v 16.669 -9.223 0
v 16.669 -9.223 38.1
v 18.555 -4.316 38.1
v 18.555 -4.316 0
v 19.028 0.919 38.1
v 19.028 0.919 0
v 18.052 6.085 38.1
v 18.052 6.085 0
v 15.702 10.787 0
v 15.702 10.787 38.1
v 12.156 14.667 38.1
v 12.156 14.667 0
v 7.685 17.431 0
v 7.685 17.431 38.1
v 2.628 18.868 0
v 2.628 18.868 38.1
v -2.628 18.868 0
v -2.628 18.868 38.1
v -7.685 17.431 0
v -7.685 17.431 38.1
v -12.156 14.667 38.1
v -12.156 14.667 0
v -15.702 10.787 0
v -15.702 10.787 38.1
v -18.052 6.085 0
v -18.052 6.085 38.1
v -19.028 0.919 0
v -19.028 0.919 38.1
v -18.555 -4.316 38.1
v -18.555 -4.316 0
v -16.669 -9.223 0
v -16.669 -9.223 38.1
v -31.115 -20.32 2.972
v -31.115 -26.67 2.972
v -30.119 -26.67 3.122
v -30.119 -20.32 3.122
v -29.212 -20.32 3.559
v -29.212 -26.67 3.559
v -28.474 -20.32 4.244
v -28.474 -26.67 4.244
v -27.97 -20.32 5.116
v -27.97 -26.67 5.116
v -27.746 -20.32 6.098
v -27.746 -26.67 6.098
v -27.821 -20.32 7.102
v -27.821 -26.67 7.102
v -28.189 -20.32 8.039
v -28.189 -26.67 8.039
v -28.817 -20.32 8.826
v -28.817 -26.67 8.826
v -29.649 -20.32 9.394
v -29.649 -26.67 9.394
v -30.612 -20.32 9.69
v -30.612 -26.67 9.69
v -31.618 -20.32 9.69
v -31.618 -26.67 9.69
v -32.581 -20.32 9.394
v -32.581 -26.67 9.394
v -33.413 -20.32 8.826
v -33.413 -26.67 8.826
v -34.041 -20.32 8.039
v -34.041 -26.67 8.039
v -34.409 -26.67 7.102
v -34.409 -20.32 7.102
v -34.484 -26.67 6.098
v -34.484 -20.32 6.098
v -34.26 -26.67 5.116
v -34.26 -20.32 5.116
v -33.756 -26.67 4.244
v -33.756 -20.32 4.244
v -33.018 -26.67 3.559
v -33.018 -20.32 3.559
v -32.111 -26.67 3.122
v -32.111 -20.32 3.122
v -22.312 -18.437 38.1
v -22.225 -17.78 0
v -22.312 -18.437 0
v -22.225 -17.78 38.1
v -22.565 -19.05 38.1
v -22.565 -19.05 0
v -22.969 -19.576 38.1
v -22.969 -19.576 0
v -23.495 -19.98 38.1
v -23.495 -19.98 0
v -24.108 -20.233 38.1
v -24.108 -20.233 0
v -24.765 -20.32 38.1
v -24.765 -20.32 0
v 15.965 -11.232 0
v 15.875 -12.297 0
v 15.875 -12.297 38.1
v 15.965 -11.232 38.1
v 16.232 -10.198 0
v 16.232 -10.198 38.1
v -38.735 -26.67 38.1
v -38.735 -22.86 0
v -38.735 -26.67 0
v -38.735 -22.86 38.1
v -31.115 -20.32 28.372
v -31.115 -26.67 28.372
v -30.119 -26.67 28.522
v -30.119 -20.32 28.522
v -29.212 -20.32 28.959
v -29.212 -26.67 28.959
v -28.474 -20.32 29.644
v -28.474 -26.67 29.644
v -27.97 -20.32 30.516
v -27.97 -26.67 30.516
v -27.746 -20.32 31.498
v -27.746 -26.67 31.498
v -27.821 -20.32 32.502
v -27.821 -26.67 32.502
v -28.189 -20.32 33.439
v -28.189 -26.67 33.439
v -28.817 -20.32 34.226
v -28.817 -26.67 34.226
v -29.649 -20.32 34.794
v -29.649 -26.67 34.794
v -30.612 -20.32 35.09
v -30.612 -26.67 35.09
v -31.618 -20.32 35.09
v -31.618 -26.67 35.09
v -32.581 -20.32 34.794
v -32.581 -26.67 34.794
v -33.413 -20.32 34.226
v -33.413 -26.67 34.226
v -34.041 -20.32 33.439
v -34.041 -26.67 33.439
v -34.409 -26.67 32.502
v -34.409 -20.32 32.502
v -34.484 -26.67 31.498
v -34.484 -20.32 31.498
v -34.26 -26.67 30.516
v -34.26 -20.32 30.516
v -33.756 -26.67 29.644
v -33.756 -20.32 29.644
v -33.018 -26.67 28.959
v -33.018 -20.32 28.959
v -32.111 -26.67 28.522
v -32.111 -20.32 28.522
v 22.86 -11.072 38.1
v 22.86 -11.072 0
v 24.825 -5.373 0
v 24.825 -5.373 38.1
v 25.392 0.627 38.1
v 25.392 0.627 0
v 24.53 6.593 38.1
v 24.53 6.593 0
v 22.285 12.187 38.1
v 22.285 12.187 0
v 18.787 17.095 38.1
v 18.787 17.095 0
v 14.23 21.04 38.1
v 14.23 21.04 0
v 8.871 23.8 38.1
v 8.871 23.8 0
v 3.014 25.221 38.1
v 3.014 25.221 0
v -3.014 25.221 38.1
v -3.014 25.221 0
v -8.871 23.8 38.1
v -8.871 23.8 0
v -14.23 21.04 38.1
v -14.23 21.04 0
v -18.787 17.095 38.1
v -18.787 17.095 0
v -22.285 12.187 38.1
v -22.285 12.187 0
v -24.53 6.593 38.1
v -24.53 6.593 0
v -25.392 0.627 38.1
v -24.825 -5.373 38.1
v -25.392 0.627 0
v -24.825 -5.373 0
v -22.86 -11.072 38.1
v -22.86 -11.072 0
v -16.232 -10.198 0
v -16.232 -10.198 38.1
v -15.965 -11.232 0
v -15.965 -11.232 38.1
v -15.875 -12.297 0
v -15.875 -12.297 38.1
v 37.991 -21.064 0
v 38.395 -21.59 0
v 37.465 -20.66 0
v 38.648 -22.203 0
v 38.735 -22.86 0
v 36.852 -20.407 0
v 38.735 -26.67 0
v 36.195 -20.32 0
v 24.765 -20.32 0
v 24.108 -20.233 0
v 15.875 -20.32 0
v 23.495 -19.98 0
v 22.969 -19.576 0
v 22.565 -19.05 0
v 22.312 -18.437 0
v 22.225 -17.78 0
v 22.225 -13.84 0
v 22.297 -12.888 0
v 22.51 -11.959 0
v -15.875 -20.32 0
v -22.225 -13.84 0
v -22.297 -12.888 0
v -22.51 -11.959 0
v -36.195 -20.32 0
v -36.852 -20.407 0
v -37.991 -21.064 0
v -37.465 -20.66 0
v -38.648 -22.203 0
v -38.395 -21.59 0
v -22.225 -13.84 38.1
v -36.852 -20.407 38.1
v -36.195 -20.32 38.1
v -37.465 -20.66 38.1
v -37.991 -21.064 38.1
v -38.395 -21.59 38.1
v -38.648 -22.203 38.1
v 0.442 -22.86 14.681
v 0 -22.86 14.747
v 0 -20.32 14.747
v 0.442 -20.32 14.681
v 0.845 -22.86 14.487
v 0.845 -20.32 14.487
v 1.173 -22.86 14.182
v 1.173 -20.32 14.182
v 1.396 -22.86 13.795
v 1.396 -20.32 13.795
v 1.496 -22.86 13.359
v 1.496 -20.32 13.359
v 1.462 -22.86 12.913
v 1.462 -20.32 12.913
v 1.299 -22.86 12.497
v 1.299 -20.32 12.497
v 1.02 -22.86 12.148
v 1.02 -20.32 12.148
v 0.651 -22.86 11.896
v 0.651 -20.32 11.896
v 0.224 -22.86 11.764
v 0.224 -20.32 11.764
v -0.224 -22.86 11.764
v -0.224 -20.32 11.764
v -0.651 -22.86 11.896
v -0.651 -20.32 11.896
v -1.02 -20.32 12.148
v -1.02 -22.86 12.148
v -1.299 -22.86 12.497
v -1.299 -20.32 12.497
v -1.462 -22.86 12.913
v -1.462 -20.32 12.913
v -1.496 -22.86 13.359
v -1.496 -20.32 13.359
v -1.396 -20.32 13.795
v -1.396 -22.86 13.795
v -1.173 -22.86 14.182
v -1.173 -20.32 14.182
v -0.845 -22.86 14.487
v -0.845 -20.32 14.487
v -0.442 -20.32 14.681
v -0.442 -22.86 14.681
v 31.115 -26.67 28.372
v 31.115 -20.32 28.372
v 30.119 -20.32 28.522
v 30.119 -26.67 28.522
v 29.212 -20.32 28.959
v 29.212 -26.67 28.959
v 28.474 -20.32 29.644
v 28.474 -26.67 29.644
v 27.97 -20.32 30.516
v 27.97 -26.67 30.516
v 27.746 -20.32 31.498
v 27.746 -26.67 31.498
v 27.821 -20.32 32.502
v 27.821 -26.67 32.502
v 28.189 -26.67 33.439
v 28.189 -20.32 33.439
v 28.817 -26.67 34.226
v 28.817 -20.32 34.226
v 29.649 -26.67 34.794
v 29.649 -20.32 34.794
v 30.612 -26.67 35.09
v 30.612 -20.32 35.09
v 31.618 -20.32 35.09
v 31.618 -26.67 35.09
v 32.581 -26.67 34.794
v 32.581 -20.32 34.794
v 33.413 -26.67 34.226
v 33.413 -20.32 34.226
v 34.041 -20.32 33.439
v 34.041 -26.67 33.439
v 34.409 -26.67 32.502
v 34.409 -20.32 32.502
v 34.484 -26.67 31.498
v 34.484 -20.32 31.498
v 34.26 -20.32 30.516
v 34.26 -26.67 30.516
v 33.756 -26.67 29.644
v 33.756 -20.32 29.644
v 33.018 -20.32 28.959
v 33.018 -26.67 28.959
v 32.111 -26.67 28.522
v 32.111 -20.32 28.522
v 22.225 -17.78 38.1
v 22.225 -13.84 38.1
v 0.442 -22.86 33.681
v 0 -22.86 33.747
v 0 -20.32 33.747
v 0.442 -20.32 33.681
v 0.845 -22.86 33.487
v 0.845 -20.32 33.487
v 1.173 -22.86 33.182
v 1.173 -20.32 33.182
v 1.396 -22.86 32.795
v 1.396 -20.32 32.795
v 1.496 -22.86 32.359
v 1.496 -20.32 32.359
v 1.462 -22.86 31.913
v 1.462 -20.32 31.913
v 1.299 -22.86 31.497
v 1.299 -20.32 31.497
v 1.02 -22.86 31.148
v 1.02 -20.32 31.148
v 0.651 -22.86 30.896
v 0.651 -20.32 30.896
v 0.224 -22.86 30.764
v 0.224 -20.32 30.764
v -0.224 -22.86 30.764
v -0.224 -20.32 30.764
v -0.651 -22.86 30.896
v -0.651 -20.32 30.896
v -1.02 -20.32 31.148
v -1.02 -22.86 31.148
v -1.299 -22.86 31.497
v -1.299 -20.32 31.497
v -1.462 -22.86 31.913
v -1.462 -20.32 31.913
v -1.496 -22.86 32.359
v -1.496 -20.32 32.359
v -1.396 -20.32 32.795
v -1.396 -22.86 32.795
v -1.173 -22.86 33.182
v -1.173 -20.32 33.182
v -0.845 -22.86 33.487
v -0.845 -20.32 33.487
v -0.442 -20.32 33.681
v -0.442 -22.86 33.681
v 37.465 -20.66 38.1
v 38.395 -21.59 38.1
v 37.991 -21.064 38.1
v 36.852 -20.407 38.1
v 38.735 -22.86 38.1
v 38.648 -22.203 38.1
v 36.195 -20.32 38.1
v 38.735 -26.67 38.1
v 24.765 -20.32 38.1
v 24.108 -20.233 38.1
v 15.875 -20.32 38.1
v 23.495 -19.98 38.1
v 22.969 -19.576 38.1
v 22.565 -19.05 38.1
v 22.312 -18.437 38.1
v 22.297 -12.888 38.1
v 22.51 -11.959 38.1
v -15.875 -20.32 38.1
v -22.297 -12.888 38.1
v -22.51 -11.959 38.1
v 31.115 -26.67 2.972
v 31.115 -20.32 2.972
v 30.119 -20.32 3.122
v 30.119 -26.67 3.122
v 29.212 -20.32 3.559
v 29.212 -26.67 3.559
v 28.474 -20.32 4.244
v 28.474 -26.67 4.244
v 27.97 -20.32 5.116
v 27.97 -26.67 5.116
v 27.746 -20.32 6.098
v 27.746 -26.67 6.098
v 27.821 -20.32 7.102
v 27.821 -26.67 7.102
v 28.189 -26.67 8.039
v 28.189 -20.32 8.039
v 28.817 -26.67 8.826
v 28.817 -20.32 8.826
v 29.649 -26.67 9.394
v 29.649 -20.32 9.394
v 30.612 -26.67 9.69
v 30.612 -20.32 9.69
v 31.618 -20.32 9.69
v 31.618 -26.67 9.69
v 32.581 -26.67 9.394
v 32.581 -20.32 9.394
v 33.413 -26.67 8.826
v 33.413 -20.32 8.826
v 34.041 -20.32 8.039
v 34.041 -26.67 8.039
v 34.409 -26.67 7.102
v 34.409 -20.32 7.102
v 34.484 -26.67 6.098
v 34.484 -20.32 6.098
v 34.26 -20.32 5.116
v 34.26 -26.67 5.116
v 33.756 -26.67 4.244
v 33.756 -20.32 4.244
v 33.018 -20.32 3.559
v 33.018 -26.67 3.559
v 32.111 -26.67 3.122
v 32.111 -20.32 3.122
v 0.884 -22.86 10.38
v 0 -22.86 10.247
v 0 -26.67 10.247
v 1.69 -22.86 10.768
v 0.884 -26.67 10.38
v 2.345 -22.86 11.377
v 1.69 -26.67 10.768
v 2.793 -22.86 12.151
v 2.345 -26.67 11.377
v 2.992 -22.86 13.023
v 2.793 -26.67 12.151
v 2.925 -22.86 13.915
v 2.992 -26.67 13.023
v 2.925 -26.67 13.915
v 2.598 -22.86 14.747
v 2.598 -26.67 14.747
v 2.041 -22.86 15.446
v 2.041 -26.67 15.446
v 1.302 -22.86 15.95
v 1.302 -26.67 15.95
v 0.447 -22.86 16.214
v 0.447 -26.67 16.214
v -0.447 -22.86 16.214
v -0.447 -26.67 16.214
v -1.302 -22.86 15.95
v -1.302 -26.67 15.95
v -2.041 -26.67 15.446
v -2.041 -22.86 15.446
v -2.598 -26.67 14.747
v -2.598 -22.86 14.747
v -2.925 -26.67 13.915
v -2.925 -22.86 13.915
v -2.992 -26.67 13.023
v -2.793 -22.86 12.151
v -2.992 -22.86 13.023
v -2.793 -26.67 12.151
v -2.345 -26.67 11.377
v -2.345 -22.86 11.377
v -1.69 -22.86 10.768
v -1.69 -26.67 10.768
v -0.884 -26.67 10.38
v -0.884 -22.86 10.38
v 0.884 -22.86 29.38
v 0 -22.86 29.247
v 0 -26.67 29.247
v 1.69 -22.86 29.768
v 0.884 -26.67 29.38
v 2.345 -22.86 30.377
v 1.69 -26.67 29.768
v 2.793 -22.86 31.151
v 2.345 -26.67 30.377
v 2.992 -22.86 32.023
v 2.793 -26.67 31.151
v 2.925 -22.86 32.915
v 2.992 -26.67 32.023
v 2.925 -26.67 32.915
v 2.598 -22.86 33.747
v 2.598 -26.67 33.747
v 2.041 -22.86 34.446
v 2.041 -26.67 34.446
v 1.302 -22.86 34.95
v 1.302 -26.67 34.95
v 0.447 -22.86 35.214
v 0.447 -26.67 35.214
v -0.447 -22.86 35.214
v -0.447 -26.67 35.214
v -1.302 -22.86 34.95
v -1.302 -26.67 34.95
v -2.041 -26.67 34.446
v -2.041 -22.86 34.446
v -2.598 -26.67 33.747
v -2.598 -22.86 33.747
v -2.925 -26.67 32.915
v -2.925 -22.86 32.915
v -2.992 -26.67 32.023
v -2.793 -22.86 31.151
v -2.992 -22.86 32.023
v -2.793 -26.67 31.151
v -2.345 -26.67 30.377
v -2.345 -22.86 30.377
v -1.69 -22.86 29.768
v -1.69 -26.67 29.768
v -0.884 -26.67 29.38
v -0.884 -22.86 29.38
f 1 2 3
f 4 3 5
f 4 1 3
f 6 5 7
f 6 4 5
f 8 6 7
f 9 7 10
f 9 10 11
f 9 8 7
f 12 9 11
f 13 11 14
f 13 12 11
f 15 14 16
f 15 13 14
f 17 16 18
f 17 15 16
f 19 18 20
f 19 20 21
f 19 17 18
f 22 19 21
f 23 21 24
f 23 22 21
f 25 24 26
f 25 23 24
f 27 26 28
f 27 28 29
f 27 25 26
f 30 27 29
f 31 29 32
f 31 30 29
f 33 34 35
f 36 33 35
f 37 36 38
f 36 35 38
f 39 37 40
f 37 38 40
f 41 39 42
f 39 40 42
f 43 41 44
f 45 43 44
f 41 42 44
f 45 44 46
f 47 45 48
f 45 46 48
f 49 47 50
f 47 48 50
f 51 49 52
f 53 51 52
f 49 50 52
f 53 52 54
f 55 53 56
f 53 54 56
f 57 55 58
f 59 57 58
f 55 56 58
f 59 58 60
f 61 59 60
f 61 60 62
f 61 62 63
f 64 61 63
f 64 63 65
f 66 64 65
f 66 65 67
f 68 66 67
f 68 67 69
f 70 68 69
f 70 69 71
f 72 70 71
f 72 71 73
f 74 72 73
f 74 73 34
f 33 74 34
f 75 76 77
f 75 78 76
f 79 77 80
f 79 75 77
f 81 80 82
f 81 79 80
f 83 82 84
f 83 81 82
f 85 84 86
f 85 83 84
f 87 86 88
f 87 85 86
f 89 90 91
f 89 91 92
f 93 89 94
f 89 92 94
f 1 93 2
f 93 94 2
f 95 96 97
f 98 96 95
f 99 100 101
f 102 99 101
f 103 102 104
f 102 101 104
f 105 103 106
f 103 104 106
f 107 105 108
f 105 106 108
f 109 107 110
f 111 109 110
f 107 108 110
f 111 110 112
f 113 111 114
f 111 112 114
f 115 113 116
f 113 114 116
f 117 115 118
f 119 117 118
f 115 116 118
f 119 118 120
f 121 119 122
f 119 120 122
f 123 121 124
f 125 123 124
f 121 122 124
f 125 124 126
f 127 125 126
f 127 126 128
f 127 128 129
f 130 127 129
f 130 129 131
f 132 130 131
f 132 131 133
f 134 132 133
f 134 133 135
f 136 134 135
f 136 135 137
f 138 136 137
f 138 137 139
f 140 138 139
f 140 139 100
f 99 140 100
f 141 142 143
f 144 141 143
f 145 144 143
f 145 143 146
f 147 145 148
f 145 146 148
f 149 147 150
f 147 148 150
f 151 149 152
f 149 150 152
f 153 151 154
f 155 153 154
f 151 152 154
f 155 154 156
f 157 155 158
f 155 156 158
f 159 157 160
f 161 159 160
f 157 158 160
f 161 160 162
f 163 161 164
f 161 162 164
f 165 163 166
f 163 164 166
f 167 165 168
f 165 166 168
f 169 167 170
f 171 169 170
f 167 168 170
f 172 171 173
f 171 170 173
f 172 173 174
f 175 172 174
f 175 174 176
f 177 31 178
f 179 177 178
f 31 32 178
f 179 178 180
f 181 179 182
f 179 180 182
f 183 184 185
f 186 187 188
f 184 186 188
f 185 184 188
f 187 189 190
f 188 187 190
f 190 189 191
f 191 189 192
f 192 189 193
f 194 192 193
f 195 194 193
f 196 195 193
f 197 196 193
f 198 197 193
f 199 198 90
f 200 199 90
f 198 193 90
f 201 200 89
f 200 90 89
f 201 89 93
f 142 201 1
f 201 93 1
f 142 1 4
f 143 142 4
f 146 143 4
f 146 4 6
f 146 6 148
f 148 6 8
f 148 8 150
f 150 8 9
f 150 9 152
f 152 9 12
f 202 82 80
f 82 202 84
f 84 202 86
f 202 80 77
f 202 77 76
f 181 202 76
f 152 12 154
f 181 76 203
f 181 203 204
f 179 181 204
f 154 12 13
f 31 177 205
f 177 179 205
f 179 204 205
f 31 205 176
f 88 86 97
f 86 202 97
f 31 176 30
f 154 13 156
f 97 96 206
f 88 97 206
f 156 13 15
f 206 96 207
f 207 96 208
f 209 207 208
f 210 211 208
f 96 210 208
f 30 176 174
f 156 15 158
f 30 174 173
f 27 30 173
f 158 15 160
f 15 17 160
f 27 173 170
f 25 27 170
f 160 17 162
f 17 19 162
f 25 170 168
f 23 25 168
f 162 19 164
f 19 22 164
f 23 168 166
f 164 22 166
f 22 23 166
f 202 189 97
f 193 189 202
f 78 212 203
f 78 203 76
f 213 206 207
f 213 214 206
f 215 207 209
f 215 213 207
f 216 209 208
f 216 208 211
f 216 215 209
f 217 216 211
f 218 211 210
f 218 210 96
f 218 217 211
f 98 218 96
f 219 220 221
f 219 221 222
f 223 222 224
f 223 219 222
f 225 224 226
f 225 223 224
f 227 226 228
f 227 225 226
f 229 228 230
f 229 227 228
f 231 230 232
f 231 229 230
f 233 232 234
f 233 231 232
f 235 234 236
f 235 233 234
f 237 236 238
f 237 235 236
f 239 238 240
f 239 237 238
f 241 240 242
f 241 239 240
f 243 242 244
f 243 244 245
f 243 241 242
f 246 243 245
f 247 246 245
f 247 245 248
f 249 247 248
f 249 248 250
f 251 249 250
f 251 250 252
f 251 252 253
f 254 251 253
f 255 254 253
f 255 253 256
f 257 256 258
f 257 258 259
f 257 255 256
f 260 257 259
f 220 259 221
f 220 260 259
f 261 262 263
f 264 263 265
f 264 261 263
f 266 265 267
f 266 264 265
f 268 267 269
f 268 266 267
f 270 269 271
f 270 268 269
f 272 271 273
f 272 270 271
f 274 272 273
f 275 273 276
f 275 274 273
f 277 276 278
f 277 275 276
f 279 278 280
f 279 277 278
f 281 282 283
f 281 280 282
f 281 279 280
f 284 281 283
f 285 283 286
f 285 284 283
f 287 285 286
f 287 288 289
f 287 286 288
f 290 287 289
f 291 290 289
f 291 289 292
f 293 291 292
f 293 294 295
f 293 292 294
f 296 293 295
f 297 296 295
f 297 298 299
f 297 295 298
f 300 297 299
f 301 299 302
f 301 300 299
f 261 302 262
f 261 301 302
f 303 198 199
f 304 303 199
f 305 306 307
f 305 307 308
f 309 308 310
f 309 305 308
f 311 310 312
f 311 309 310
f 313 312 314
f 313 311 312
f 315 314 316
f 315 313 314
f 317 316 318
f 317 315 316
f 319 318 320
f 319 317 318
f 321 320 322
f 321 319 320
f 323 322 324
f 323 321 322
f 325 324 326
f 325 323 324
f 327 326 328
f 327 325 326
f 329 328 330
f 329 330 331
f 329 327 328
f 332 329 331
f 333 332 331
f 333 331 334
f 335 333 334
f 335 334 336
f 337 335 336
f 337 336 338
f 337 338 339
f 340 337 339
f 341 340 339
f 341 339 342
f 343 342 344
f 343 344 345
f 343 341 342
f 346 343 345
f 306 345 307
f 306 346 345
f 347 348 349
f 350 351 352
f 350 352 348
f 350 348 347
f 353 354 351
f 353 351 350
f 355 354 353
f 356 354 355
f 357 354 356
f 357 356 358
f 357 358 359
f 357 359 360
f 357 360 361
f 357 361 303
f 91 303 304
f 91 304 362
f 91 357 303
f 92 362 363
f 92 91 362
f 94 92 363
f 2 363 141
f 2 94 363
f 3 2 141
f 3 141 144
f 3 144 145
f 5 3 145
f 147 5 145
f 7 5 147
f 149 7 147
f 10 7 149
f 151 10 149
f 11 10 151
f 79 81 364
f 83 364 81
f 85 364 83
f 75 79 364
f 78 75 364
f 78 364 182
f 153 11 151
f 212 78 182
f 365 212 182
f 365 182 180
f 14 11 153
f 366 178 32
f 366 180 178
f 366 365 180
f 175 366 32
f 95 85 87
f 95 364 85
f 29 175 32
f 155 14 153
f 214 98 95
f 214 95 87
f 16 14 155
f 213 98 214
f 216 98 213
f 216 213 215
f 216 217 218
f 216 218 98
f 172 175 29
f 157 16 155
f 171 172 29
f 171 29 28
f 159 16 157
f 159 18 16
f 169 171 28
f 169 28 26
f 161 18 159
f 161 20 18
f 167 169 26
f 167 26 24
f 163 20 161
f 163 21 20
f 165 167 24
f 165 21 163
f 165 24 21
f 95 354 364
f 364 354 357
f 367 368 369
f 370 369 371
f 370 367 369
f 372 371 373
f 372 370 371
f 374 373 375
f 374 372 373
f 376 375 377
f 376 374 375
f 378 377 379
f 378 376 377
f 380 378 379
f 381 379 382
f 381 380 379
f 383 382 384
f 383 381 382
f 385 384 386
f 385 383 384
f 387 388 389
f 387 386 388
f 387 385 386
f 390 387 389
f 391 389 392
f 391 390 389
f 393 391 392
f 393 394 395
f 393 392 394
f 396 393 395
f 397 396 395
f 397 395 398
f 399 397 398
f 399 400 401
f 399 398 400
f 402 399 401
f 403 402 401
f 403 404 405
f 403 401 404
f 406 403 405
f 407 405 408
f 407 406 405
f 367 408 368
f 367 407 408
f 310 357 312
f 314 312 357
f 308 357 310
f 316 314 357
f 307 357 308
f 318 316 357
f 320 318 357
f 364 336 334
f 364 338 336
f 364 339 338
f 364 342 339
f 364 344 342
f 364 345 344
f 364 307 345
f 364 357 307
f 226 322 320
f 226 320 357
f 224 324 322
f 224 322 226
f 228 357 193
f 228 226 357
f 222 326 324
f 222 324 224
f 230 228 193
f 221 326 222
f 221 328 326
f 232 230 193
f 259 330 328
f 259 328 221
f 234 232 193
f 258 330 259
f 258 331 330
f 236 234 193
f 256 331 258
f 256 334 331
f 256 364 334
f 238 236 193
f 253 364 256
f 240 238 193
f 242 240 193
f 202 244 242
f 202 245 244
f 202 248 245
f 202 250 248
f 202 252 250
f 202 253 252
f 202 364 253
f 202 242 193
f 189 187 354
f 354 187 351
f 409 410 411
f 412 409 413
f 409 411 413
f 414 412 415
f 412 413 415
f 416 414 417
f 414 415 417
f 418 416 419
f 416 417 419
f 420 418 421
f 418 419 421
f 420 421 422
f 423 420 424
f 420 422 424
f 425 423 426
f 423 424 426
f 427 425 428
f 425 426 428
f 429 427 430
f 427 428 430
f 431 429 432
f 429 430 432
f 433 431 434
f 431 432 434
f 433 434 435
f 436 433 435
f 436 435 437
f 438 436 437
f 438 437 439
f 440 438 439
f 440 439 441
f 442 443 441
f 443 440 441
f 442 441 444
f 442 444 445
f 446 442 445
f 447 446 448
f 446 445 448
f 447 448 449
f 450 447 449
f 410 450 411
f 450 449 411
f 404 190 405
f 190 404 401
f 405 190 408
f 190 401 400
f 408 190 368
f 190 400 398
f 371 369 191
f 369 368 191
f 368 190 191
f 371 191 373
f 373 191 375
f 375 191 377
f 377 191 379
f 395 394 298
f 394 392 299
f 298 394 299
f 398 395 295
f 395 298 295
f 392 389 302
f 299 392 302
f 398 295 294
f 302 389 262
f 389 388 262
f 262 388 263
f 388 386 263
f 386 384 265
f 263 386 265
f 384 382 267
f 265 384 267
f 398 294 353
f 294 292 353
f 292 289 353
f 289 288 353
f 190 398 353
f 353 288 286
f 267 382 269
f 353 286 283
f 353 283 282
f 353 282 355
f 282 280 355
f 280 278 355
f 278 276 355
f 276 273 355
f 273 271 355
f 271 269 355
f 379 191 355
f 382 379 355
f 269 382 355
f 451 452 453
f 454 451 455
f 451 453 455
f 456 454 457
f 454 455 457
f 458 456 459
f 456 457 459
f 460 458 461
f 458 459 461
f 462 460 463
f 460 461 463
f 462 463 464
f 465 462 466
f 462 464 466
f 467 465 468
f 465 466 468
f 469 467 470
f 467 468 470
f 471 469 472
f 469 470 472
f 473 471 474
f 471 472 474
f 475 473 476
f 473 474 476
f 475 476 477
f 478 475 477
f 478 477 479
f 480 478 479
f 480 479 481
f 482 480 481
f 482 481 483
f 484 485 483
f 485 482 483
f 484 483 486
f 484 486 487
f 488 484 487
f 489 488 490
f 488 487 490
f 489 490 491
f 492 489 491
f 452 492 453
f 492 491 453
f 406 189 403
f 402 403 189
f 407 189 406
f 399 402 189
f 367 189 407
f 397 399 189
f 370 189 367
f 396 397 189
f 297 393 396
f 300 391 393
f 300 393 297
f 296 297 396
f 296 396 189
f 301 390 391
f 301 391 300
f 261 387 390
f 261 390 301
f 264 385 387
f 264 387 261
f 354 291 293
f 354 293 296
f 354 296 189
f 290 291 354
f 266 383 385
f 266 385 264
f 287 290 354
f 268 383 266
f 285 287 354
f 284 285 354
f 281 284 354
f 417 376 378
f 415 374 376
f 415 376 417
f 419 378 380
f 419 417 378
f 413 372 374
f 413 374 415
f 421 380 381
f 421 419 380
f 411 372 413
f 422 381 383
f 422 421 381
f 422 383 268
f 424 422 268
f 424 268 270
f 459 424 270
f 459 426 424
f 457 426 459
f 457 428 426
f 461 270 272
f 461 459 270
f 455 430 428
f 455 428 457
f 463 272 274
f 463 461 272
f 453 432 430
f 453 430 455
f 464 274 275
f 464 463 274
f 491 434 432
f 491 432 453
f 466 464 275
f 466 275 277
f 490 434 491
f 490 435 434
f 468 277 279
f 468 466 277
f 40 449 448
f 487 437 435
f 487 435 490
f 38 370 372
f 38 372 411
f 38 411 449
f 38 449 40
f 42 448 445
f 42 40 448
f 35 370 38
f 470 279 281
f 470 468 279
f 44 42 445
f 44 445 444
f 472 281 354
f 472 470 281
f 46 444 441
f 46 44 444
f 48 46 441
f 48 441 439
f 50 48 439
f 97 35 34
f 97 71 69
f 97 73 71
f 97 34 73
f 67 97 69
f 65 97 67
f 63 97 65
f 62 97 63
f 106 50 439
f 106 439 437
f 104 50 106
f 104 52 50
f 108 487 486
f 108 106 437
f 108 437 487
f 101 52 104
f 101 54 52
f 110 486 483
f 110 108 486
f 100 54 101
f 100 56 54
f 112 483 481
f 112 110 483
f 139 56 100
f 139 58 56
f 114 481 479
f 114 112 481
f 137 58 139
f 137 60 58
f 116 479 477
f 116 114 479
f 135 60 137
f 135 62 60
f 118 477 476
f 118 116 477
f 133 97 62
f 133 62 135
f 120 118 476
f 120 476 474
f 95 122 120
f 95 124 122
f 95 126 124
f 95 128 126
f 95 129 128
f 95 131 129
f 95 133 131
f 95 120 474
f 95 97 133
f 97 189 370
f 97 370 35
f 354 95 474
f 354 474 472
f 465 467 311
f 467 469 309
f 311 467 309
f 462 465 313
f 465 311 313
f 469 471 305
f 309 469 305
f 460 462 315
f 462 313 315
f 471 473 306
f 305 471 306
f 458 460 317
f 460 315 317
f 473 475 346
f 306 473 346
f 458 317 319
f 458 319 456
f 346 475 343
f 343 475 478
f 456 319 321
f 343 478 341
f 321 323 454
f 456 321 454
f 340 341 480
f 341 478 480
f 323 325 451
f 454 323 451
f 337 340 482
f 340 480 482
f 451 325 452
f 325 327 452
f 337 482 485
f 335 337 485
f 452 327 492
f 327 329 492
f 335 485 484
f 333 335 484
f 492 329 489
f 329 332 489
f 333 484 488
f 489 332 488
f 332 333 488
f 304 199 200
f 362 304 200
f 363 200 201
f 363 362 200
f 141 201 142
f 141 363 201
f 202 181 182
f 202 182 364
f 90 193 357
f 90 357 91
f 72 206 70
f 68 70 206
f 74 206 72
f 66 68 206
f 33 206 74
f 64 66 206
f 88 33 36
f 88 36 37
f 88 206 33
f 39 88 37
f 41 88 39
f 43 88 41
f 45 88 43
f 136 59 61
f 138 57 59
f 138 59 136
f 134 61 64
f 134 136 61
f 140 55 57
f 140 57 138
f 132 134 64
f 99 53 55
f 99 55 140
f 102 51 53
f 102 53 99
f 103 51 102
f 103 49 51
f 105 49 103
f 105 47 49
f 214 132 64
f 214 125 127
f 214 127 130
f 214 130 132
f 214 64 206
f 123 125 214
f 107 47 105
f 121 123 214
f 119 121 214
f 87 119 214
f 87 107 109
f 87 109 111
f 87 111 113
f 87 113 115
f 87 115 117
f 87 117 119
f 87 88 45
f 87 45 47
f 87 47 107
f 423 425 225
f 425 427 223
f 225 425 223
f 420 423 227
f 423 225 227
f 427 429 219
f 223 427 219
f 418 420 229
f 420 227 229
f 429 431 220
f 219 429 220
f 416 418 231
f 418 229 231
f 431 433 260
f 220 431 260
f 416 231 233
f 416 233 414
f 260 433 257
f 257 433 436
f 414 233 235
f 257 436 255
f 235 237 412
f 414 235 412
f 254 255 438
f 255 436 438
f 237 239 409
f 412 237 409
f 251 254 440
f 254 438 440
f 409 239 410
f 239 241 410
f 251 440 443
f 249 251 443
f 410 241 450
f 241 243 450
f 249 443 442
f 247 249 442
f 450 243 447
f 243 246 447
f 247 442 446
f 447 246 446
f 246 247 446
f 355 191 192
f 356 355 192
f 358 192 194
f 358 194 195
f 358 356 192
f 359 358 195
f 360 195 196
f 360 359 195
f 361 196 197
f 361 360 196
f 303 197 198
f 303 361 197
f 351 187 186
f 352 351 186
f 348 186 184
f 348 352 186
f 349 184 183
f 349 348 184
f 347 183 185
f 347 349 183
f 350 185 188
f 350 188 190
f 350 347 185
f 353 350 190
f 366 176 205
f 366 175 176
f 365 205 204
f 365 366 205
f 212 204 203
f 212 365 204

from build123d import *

# Parameters (mm, degrees)
BOSS_EXTRUDE1_DEPTH = 38.1
FILLET1_R           = 6.35
CUT_EXTRUDE1_REACH  = 71.34
SKETCH2_R           = 1.7
SKETCH2_3_R         = 3
SKETCH2_3_R_2       = 1.7
CUT_EXTRUDE2_DEPTH  = 6.35
SKETCH5_W           = 38.1
SKETCH5_H           = 6.35
BOSS_EXTRUDE3_DEPTH = 16.51
SKETCH6_R           = 3.3782
CUT_EXTRUDE3_DEPTH  = 76.254867783
FILLET2_R           = 2.54
BOSS_EXTRUDE4_START = -2.54
SKETCH7_R           = 3
SKETCH7_R_2         = 1.5
BOSS_EXTRUDE4_DEPTH = 2.54


with BuildPart() as part:
    # Sketch1 → Boss-Extrude1 (new body)
    with BuildSketch(Plane.XY):
        with BuildLine():
            Line((22.225, -26.67), (22.225, -12.296722124))
            ThreePointArc((22.225, -12.296722124), (0, 25.4), (-22.225, -12.296722124))
            Line((-22.225, -12.296722124), (-22.225, -26.67))
            Line((-22.225, -26.67), (22.225, -26.67))
        make_face()
        with BuildLine():
            Line((-15.875, -20.32), (15.875, -20.32))
            Line((15.875, -20.32), (15.875, -10.530283709))
            ThreePointArc((15.875, -10.530283709), (0, 19.05), (-15.875, -10.530283709))
            Line((-15.875, -10.530283709), (-15.875, -20.32))
        make_face(mode=Mode.SUBTRACT)
    extrude(amount=BOSS_EXTRUDE1_DEPTH)

    # Fillet1
    fillet1_edges = [part.edges().sort_by_distance(p)[0] for p in [
        (22.225, -12.296722124, 19.05),
        (15.875, -10.530283709, 19.05),
        (-22.225, -12.296722124, 19.05),
        (-15.875, -10.530283709, 19.05),
    ]]
    fillet(fillet1_edges, radius=FILLET1_R)

    # Sketch2 → Cut-Extrude1 (cut, up to next)
    with BuildSketch(Plane.XZ.offset(26.67), mode=Mode.PRIVATE) as cut_extrude1_sk1:
        with Locations((0, 32.2471478)):
            Circle(SKETCH2_R)
    cut_extrude1_tool1 = extrude(cut_extrude1_sk1.sketch, amount=-CUT_EXTRUDE1_REACH, mode=Mode.PRIVATE) & part.part
    # Sketch2 → Cut-Extrude1 (cut, up to next)
    with BuildSketch(Plane.XZ.offset(26.67), mode=Mode.PRIVATE) as cut_extrude1_sk2:
        with Locations((0, 13.2471478)):
            Circle(SKETCH2_R)
    cut_extrude1_tool2 = extrude(cut_extrude1_sk2.sketch, amount=-CUT_EXTRUDE1_REACH, mode=Mode.PRIVATE) & part.part
    add(cut_extrude1_tool1.solids().sort_by_distance((0, -26.67, 32.247148))[0], mode=Mode.SUBTRACT)
    add(cut_extrude1_tool2.solids().sort_by_distance((0, -26.67, 13.247148))[0], mode=Mode.SUBTRACT)

    # Sketch2<3> → Cut-Extrude2 (cut)
    # profile 1 of 2: a face of its own
    with BuildSketch(Plane.XZ.offset(26.67)):
        with Locations((0, 32.2471478)):
            Circle(SKETCH2_3_R)
        with Locations((0, 32.2471478)):
            Circle(SKETCH2_3_R_2, mode=Mode.SUBTRACT)
    # profile 2 of 2: a face of its own
    with BuildSketch(Plane.XZ.offset(26.67)):
        with Locations((0, 13.2471478)):
            Circle(SKETCH2_3_R)
        with Locations((0, 13.2471478)):
            Circle(SKETCH2_3_R_2, mode=Mode.SUBTRACT)
    extrude(amount=-CUT_EXTRUDE2_DEPTH, mode=Mode.SUBTRACT)

    # Sketch5 → Boss-Extrude3 (add)
    with BuildSketch(Plane.ZY.offset(22.225)):
        with Locations((19.05, -23.495)):
            Rectangle(SKETCH5_W, SKETCH5_H)
    boss_extrude3 = extrude(amount=BOSS_EXTRUDE3_DEPTH)

    # Sketch6 → Cut-Extrude3 (cut, through all)
    with BuildSketch(Plane(origin=(0, -26.67, 0), x_dir=(-1, 0, 0), z_dir=(0, -1, 0))):
        with Locations((31.115, -6.35)):
            Circle(SKETCH6_R)
        with Locations((31.115, -31.75)):
            Circle(SKETCH6_R)
    cut_extrude3 = extrude(amount=-CUT_EXTRUDE3_DEPTH, mode=Mode.SUBTRACT)

    # Mirror1: Boss-Extrude3, Cut-Extrude3 across plane
    add(boss_extrude3.mirror(Plane(origin=(0, 0, 0), x_dir=(0, 0, 1), z_dir=(1, 0, 0))))
    add(cut_extrude3.mirror(Plane(origin=(0, 0, 0), x_dir=(0, 0, 1), z_dir=(1, 0, 0))), mode=Mode.SUBTRACT)

    # Fillet2
    fillet2_edges = [part.edges().sort_by_distance(p)[0] for p in [
        (38.735, -20.32, 19.05),
        (22.225, -20.32, 19.05),
        (-38.735, -20.32, 19.05),
        (-22.225, -20.32, 19.05),
    ]]
    fillet(fillet2_edges, radius=FILLET2_R)

    # Sketch7 → Boss-Extrude4 (add)
    # profile 1 of 2: a face of its own
    with BuildSketch(Plane(origin=(0, -20.32, 0), x_dir=(1, 0, 0), z_dir=(0, 1, 0)).offset(BOSS_EXTRUDE4_START)):
        with Locations((0, -13.2471478)):
            Circle(SKETCH7_R)
        with Locations((0, -13.2471478)):
            Circle(SKETCH7_R_2, mode=Mode.SUBTRACT)
    # profile 2 of 2: a face of its own
    with BuildSketch(Plane(origin=(0, -20.32, 0), x_dir=(1, 0, 0), z_dir=(0, 1, 0)).offset(BOSS_EXTRUDE4_START)):
        with Locations((0, -32.2471478)):
            Circle(SKETCH7_R)
        with Locations((0, -32.2471478)):
            Circle(SKETCH7_R_2, mode=Mode.SUBTRACT)
    extrude(amount=BOSS_EXTRUDE4_DEPTH)


solid = part.part
